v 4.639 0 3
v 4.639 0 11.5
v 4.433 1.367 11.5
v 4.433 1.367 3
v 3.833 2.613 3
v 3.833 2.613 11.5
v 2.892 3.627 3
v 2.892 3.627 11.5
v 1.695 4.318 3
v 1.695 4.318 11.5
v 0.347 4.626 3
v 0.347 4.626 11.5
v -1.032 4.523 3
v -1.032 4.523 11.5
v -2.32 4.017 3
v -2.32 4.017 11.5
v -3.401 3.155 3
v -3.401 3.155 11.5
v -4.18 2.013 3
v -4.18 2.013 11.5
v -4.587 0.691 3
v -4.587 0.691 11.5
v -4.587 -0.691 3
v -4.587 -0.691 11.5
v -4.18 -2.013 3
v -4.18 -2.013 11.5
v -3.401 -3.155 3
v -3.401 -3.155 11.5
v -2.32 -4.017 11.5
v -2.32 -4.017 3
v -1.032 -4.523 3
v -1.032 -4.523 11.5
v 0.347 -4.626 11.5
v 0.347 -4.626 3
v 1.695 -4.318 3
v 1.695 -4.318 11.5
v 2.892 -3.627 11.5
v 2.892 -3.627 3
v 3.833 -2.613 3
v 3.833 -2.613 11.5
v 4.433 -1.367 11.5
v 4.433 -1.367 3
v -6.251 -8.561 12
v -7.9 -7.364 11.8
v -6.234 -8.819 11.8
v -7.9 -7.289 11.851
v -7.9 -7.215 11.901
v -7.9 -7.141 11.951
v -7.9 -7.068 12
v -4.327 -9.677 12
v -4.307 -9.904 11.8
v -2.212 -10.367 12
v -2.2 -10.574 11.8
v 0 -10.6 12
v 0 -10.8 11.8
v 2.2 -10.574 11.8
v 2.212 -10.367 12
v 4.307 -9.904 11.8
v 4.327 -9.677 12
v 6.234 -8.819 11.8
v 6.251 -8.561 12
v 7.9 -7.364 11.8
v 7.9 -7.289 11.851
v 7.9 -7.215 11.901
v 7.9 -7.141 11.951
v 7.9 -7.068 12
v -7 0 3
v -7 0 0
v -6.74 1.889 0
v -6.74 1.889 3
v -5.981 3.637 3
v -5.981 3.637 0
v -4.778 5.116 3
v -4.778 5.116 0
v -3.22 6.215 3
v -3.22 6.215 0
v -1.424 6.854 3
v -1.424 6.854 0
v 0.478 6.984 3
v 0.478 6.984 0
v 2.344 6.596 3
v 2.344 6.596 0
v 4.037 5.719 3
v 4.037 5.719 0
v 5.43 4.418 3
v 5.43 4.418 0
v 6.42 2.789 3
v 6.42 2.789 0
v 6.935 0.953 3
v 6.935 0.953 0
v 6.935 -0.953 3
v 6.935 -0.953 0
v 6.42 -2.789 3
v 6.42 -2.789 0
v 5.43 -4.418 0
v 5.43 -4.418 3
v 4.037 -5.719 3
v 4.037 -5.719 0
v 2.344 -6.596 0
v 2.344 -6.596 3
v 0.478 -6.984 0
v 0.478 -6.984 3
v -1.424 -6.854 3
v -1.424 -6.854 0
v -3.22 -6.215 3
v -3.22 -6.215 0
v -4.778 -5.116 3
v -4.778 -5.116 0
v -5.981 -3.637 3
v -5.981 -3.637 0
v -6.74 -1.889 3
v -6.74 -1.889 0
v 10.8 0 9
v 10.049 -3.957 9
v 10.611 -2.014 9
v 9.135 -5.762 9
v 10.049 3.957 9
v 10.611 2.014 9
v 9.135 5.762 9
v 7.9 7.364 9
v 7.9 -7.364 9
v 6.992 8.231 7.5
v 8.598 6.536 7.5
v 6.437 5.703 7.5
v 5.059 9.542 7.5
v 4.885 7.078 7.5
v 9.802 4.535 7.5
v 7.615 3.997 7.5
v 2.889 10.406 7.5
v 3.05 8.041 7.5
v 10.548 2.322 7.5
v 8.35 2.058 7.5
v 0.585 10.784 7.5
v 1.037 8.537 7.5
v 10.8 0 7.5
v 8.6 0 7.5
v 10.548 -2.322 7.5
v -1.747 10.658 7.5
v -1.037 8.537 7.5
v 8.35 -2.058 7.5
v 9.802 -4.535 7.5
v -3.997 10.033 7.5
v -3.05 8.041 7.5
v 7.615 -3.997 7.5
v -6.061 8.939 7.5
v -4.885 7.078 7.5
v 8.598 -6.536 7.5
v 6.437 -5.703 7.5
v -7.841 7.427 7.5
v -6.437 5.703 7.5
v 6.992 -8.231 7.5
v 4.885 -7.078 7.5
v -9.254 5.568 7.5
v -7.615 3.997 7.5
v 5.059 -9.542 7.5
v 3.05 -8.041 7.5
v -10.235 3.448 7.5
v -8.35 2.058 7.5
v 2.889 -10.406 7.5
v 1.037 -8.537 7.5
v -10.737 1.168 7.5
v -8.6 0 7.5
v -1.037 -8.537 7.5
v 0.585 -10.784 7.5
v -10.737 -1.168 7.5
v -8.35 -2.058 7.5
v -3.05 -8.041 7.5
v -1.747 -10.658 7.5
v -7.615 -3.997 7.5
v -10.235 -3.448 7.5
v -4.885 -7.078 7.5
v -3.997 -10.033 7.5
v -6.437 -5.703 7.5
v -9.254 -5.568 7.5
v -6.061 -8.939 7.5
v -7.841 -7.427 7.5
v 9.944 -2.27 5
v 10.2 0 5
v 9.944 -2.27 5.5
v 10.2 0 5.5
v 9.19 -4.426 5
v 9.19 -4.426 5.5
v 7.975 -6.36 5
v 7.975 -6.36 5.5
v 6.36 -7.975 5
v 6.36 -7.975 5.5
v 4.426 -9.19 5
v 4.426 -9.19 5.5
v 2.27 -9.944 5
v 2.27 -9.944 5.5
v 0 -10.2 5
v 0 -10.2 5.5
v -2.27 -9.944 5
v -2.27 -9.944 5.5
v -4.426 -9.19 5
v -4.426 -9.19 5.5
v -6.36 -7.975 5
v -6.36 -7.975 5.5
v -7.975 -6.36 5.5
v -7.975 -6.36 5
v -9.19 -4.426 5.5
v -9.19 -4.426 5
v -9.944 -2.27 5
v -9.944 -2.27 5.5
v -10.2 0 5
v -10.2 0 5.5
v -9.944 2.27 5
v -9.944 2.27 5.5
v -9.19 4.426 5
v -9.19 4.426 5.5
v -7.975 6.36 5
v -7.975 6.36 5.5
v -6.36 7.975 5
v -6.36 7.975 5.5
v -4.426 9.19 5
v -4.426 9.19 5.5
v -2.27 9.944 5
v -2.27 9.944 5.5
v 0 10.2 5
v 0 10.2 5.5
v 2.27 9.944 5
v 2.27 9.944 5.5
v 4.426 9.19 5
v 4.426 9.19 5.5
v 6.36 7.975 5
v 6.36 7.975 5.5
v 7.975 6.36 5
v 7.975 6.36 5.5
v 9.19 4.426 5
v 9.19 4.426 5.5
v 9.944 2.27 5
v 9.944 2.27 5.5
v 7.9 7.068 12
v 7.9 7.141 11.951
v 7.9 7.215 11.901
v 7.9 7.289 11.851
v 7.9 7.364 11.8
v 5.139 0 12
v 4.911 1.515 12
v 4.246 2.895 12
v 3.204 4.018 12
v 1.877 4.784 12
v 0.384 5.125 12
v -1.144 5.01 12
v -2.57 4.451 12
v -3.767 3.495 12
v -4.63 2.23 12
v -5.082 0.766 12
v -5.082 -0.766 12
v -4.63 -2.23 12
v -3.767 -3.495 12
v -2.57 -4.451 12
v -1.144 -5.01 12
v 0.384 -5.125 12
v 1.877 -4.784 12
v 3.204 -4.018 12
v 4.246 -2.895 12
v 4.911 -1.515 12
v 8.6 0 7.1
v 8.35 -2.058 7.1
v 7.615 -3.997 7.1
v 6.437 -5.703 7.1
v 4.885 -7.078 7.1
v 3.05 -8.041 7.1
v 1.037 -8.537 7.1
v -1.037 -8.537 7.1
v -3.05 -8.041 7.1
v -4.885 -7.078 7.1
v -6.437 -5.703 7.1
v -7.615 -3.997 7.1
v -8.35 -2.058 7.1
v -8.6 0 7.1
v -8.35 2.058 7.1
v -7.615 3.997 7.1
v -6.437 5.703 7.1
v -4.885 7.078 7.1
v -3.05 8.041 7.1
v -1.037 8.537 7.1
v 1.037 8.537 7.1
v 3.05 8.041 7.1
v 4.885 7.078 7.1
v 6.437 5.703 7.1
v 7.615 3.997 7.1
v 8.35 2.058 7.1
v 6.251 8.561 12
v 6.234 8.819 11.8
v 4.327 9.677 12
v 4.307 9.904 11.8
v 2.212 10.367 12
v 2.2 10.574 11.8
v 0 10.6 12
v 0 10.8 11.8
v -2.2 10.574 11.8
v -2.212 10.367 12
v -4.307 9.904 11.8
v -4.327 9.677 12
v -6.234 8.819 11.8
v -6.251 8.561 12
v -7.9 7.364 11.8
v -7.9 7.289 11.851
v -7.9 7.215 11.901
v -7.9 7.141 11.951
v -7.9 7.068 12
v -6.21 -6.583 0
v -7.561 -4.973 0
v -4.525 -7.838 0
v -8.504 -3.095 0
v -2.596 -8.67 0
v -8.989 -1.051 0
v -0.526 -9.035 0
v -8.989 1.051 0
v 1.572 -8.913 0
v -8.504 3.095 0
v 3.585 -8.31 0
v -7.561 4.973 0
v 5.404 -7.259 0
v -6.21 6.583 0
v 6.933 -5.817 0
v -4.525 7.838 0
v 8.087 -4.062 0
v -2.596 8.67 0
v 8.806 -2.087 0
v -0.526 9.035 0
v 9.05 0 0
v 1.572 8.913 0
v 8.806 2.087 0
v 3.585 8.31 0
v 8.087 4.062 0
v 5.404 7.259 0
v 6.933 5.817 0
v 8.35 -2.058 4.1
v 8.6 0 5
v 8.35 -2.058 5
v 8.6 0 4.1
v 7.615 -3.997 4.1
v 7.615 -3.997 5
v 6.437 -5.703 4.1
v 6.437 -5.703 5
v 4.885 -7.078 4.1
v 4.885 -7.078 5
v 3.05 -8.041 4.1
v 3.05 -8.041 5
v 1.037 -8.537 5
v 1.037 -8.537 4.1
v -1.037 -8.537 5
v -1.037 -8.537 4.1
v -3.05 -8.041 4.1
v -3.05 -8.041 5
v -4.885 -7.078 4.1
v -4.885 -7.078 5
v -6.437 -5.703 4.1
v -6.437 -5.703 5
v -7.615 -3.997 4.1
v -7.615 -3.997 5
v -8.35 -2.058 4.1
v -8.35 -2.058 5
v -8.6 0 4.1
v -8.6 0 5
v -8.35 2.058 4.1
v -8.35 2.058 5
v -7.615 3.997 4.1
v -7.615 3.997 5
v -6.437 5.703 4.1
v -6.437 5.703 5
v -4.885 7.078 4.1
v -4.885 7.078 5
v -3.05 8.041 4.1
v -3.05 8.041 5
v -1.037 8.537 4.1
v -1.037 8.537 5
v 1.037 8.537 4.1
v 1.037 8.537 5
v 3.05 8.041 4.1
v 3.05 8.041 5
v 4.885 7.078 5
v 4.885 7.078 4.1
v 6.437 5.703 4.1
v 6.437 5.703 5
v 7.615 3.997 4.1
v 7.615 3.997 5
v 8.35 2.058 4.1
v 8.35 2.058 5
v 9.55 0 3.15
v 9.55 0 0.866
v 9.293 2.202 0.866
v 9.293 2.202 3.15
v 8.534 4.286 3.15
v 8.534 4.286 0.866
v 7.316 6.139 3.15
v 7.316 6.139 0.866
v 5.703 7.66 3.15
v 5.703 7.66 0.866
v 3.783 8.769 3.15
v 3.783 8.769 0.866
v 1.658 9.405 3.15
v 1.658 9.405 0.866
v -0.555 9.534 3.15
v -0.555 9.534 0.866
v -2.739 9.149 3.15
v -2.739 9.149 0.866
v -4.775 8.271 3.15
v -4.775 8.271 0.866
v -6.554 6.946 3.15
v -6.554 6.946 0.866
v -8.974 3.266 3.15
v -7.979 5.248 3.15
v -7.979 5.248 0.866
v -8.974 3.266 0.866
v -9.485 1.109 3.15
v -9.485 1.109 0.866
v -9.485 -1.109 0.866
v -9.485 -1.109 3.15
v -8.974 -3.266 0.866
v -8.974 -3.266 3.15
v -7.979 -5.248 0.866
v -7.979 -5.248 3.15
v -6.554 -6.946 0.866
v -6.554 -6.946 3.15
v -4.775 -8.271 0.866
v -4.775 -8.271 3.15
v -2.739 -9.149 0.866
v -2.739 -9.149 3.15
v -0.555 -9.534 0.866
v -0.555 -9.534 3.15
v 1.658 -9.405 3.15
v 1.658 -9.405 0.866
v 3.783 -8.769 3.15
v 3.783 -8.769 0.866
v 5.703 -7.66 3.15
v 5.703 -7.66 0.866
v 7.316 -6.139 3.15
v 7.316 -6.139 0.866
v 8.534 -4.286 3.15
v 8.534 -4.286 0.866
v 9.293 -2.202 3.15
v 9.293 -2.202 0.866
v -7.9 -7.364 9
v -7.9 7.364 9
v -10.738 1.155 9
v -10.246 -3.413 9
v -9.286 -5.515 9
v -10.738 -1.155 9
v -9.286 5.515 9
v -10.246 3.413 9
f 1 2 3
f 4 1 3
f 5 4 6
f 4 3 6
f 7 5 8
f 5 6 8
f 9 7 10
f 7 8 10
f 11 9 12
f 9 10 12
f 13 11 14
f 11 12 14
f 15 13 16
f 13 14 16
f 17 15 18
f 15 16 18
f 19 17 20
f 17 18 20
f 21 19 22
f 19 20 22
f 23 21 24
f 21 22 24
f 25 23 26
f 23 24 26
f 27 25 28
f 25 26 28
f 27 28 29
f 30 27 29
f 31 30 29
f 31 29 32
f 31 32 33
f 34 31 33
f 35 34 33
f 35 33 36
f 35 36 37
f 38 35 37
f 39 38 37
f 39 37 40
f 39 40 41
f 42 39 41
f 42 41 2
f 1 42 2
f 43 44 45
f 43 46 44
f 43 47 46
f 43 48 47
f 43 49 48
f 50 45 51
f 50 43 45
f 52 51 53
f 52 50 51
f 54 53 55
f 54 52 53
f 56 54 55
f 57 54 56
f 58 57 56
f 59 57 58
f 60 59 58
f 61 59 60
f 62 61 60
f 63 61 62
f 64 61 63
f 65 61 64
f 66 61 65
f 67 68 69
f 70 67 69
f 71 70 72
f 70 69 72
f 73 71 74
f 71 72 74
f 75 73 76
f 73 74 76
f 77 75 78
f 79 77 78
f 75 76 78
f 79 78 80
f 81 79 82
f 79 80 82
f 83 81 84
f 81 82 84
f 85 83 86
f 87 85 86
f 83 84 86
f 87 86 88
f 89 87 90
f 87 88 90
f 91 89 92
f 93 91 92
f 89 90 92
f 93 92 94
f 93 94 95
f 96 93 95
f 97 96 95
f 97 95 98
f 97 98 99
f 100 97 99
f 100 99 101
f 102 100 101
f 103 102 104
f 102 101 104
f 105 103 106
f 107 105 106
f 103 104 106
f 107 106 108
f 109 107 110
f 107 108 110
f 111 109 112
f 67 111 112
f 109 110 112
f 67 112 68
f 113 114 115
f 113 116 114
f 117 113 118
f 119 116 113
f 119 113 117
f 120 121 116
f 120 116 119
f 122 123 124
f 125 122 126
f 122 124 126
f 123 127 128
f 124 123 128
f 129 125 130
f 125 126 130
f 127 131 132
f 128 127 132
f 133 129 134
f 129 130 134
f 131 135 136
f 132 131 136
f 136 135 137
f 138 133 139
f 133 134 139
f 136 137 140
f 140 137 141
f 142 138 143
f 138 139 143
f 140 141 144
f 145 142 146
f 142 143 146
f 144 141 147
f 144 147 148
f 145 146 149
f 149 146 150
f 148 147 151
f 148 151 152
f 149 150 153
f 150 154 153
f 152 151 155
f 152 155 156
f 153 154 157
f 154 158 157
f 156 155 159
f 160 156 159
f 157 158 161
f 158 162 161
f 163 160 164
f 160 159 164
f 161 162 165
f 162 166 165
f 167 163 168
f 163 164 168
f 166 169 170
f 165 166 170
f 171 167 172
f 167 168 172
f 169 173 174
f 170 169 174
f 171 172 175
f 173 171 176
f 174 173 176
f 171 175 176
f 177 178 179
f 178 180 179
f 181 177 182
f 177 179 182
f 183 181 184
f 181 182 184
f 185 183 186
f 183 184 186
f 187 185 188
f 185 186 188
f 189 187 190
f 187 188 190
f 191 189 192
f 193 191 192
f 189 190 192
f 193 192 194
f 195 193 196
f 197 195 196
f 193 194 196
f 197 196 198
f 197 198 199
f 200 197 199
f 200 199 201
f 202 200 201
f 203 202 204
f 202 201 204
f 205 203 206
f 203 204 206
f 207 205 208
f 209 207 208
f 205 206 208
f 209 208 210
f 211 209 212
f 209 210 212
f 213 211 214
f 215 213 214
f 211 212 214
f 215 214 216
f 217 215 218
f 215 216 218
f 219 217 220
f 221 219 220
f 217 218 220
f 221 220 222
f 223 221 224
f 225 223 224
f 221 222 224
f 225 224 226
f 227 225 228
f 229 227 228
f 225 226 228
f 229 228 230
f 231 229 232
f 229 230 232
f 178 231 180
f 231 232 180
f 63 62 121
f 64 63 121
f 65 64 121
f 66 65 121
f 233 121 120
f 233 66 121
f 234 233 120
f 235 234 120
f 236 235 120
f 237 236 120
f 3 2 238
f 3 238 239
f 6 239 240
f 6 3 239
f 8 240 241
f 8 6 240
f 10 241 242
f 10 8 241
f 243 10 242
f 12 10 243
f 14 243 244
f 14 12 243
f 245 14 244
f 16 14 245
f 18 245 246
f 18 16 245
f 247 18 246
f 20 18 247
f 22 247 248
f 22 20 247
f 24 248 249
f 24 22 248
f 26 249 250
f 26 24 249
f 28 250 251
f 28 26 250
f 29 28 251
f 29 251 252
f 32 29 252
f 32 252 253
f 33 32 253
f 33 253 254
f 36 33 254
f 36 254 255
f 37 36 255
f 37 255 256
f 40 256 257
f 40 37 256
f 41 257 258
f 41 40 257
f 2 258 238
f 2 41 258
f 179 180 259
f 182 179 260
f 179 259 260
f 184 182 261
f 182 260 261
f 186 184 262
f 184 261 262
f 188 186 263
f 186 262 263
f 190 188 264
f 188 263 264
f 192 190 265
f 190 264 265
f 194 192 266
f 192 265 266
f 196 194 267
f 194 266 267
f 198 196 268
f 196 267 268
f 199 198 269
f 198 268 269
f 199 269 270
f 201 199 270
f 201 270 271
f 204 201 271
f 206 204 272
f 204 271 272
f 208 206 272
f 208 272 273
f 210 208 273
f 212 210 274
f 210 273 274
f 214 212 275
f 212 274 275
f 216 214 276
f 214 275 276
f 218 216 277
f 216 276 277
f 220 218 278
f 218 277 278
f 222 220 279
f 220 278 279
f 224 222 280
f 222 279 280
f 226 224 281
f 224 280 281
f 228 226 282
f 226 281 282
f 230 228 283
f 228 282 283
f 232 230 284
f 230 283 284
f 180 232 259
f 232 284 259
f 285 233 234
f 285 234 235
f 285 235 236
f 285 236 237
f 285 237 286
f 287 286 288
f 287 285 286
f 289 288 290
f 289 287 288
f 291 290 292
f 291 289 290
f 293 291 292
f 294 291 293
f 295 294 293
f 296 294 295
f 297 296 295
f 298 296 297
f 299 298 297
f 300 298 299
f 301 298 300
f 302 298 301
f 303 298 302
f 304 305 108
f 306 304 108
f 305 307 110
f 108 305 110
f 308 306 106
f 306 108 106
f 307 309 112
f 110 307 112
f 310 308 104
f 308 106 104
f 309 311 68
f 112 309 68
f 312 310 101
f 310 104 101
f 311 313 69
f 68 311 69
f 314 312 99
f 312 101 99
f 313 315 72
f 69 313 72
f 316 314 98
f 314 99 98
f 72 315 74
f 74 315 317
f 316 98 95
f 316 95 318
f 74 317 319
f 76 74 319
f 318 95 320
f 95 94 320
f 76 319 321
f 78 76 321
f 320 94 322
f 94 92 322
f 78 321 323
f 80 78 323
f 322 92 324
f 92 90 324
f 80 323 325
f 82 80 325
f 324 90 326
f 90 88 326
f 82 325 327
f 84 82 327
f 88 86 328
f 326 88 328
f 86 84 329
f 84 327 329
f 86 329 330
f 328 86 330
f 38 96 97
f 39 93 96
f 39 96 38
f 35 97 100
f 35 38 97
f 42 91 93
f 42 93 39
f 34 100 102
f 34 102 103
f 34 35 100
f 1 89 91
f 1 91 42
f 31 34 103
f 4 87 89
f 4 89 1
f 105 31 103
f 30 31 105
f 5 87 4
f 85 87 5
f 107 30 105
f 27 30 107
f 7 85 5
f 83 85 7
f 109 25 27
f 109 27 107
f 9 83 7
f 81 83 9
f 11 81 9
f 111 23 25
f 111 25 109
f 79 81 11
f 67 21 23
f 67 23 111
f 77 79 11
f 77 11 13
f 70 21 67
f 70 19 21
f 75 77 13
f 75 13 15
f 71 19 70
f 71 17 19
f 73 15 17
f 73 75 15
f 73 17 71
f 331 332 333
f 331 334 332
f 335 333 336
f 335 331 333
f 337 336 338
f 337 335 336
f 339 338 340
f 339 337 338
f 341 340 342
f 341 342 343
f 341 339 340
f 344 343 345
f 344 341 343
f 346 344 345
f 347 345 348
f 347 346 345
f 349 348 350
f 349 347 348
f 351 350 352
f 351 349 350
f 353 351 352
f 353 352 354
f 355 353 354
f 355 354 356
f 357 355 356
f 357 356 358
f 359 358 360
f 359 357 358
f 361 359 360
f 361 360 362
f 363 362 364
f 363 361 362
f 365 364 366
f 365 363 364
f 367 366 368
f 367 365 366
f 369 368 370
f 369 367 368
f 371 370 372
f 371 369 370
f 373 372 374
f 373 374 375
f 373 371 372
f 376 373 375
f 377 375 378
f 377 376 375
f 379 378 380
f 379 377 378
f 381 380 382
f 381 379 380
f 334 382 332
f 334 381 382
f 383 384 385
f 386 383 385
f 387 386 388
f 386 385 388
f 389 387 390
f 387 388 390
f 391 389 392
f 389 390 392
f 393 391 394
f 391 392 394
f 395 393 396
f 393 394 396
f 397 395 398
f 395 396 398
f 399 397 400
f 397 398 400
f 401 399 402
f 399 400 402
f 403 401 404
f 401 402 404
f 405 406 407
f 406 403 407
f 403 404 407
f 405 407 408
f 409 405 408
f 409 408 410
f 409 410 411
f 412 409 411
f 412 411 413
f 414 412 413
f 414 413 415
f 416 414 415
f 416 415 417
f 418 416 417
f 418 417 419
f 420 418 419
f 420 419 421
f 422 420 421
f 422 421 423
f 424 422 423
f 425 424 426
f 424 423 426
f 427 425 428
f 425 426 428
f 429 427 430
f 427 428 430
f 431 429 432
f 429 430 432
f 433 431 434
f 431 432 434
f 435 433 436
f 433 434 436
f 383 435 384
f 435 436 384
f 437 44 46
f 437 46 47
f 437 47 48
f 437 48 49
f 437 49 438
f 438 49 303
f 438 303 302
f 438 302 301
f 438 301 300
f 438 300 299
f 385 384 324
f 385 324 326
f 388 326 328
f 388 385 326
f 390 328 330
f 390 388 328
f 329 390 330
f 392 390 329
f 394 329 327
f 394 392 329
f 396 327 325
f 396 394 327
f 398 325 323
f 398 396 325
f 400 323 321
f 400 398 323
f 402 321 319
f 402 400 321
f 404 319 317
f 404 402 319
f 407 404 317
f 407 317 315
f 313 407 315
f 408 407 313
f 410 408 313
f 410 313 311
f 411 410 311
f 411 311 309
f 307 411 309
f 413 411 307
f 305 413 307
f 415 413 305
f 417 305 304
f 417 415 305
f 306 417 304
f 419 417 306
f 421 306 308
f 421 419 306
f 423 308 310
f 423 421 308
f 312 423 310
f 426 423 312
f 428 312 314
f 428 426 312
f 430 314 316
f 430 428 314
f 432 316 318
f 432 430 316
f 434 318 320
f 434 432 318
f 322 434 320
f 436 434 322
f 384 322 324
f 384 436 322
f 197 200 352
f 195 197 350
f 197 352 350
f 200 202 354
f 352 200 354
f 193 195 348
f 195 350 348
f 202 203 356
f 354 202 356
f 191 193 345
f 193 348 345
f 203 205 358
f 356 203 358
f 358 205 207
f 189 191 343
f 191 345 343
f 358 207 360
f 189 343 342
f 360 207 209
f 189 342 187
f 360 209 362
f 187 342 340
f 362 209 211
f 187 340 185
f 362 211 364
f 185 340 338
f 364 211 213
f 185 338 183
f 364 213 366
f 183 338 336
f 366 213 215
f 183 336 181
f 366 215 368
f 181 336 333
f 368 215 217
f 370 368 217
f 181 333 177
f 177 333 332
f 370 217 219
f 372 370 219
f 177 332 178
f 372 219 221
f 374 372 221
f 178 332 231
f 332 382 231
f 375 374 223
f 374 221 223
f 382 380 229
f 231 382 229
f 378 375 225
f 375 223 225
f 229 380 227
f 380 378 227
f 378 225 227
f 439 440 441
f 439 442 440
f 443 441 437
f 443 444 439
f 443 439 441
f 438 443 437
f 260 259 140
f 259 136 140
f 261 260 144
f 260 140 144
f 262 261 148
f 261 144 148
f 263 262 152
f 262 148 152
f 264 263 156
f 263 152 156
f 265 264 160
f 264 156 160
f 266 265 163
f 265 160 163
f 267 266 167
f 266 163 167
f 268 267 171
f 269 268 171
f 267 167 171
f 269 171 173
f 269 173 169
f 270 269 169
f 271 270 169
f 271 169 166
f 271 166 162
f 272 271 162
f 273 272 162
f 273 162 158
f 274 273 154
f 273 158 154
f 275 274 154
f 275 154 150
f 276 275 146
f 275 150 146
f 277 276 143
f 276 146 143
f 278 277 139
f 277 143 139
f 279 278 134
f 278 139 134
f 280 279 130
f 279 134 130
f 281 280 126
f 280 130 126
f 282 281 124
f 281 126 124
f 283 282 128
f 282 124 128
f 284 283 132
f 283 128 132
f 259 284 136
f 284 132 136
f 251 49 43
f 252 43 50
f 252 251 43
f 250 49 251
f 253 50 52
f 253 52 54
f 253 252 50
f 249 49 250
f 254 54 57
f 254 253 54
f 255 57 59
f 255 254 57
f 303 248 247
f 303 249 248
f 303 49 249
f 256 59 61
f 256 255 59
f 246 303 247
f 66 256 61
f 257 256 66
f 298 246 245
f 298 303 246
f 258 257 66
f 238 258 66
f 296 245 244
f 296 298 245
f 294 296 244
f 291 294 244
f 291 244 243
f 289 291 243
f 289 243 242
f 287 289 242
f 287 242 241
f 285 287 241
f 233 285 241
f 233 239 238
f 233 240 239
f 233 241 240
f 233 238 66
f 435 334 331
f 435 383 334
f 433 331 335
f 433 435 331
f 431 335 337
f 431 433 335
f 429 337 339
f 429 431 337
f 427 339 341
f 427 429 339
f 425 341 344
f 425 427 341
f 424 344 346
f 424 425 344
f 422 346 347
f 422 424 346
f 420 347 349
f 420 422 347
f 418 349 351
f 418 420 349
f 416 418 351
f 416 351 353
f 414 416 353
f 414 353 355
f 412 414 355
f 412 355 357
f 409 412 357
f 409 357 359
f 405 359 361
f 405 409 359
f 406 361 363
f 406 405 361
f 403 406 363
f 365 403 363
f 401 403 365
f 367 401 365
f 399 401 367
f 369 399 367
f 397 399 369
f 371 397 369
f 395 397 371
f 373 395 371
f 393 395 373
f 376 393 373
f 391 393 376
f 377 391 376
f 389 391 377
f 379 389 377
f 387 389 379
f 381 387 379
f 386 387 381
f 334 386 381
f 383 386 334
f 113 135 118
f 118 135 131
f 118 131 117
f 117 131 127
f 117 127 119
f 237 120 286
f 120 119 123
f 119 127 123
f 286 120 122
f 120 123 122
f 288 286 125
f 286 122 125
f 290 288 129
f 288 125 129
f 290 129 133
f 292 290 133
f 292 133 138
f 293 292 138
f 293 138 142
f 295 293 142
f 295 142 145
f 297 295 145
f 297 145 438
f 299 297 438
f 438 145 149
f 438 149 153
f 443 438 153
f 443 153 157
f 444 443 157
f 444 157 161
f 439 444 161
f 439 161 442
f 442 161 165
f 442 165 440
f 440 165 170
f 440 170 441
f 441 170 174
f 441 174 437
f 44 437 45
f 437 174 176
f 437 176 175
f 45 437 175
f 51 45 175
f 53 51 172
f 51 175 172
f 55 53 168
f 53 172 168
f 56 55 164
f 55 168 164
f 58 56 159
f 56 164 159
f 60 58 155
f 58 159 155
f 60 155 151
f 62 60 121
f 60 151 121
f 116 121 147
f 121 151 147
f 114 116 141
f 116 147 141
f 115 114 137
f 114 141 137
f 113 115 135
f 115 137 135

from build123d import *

# Parameters (mm, degrees)
SKETCH1_R                = 9.55
TUBEINTERFACE1_DEPTH     = 5
SKETCH3_R                = 10.8
BODY_DEPTH               = 7
BODYCHAMFER_SIZE         = 0.2
SKETCH4_W                = 10
SKETCH4_H                = 75
FLATS_DEPTH              = 3
SKETCH27_R               = 7
HEADCOVERBORE_DEPTH      = 3
SKETCH28_R               = 4.639
INLINE_PORT_DEPTH        = 20.423696867
INLINE_PORT_CHAMFER_SIZE = 0.5
CHAMFER4_SIZE            = 0.5
CHAMFER4_SIZE2           = 0.866025404


with BuildPart() as part:
    # Sketch1 → TubeInterface1 (new body)
    with BuildSketch(Plane.XY):
        Circle(SKETCH1_R)
    extrude(amount=TUBEINTERFACE1_DEPTH)

    # Sketch3 → Body (add)
    with BuildSketch(Plane.XY.offset(5)):
        Circle(SKETCH3_R)
    extrude(amount=BODY_DEPTH)

    # BodyChamfer
    bodychamfer_edges = [part.edges().sort_by_distance(p)[0] for p in [
        (-10.8, 0, 12),
    ]]
    chamfer(bodychamfer_edges, length=BODYCHAMFER_SIZE)

    # Sketch4 → Flats (cut)
    with BuildSketch(Plane.XY.offset(12)):
        with Locations((-12.9, 0)):
            Rectangle(SKETCH4_W, SKETCH4_H)
        with Locations((12.9, 0)):
            Rectangle(SKETCH4_W, SKETCH4_H)
    extrude(amount=-FLATS_DEPTH, mode=Mode.SUBTRACT)

    # Sketch23 → RodCoverCrimp (revolve, cut)
    with BuildSketch(Plane(origin=(0, 0, 0), x_dir=(0, 0, -1), z_dir=(1, 0, 0)), mode=Mode.PRIVATE) as rodcovercrimp_sk:
        Polygon((-7.5, 13.6), (-5, 13.6), (-5, 10.2), (-5.5, 10.2), (-7.1, 8.6), (-7.5, 8.6), align=None)
    revolve(rodcovercrimp_sk.sketch.rotate(Axis((0, 0, 0), (0, 0, -1)), 90), axis=Axis((0, 0, 0), (0, 0, -1)), mode=Mode.SUBTRACT)

    # Sketch24 → TubeInterfaceCrimp (revolve, cut)
    with BuildSketch(Plane(origin=(0, 0, 0), x_dir=(0, 0, -1), z_dir=(1, 0, 0)), mode=Mode.PRIVATE) as tubeinterfacecrimp_sk:
        Polygon((-5, 34.292463075), (-5, 8.6), (-4.1, 8.6), (-3.15, 9.55), (0, 9.55), (0, 34.292463075), align=None)
    revolve(tubeinterfacecrimp_sk.sketch.rotate(Axis((0, 0, 0), (0, 0, -1)), 90), axis=Axis((0, 0, 0), (0, 0, -1)), mode=Mode.SUBTRACT)

    # Sketch27 → HeadCoverBore (cut)
    with BuildSketch(Plane(origin=(0, 0, 0), x_dir=(-1, 0, 0), z_dir=(0, 0, -1))):
        Circle(SKETCH27_R)
    extrude(amount=-HEADCOVERBORE_DEPTH, mode=Mode.SUBTRACT)

    # Sketch28 → Inline Port (cut, through all)
    with BuildSketch(Plane.XY.offset(12)):
        Circle(SKETCH28_R)
    extrude(amount=-INLINE_PORT_DEPTH, mode=Mode.SUBTRACT)

    # Inline Port Chamfer
    inline_port_chamfer_edges = [part.edges().sort_by_distance(p)[0] for p in [
        (-4.639, 0, 12),
    ]]
    chamfer(inline_port_chamfer_edges, length=INLINE_PORT_CHAMFER_SIZE)

    # Chamfer4
    chamfer4_edges = [part.edges().sort_by_distance(p)[0] for p in [
        (-9.55, 0, 0),
    ]]
    chamfer4_side = [part.faces().sort_by_distance(p)[0] for p in [
        (-9.27988521, 0, 0),
    ]]
    chamfer(chamfer4_edges, length=CHAMFER4_SIZE, length2=CHAMFER4_SIZE2, reference=chamfer4_side[0])


solid = part.part
